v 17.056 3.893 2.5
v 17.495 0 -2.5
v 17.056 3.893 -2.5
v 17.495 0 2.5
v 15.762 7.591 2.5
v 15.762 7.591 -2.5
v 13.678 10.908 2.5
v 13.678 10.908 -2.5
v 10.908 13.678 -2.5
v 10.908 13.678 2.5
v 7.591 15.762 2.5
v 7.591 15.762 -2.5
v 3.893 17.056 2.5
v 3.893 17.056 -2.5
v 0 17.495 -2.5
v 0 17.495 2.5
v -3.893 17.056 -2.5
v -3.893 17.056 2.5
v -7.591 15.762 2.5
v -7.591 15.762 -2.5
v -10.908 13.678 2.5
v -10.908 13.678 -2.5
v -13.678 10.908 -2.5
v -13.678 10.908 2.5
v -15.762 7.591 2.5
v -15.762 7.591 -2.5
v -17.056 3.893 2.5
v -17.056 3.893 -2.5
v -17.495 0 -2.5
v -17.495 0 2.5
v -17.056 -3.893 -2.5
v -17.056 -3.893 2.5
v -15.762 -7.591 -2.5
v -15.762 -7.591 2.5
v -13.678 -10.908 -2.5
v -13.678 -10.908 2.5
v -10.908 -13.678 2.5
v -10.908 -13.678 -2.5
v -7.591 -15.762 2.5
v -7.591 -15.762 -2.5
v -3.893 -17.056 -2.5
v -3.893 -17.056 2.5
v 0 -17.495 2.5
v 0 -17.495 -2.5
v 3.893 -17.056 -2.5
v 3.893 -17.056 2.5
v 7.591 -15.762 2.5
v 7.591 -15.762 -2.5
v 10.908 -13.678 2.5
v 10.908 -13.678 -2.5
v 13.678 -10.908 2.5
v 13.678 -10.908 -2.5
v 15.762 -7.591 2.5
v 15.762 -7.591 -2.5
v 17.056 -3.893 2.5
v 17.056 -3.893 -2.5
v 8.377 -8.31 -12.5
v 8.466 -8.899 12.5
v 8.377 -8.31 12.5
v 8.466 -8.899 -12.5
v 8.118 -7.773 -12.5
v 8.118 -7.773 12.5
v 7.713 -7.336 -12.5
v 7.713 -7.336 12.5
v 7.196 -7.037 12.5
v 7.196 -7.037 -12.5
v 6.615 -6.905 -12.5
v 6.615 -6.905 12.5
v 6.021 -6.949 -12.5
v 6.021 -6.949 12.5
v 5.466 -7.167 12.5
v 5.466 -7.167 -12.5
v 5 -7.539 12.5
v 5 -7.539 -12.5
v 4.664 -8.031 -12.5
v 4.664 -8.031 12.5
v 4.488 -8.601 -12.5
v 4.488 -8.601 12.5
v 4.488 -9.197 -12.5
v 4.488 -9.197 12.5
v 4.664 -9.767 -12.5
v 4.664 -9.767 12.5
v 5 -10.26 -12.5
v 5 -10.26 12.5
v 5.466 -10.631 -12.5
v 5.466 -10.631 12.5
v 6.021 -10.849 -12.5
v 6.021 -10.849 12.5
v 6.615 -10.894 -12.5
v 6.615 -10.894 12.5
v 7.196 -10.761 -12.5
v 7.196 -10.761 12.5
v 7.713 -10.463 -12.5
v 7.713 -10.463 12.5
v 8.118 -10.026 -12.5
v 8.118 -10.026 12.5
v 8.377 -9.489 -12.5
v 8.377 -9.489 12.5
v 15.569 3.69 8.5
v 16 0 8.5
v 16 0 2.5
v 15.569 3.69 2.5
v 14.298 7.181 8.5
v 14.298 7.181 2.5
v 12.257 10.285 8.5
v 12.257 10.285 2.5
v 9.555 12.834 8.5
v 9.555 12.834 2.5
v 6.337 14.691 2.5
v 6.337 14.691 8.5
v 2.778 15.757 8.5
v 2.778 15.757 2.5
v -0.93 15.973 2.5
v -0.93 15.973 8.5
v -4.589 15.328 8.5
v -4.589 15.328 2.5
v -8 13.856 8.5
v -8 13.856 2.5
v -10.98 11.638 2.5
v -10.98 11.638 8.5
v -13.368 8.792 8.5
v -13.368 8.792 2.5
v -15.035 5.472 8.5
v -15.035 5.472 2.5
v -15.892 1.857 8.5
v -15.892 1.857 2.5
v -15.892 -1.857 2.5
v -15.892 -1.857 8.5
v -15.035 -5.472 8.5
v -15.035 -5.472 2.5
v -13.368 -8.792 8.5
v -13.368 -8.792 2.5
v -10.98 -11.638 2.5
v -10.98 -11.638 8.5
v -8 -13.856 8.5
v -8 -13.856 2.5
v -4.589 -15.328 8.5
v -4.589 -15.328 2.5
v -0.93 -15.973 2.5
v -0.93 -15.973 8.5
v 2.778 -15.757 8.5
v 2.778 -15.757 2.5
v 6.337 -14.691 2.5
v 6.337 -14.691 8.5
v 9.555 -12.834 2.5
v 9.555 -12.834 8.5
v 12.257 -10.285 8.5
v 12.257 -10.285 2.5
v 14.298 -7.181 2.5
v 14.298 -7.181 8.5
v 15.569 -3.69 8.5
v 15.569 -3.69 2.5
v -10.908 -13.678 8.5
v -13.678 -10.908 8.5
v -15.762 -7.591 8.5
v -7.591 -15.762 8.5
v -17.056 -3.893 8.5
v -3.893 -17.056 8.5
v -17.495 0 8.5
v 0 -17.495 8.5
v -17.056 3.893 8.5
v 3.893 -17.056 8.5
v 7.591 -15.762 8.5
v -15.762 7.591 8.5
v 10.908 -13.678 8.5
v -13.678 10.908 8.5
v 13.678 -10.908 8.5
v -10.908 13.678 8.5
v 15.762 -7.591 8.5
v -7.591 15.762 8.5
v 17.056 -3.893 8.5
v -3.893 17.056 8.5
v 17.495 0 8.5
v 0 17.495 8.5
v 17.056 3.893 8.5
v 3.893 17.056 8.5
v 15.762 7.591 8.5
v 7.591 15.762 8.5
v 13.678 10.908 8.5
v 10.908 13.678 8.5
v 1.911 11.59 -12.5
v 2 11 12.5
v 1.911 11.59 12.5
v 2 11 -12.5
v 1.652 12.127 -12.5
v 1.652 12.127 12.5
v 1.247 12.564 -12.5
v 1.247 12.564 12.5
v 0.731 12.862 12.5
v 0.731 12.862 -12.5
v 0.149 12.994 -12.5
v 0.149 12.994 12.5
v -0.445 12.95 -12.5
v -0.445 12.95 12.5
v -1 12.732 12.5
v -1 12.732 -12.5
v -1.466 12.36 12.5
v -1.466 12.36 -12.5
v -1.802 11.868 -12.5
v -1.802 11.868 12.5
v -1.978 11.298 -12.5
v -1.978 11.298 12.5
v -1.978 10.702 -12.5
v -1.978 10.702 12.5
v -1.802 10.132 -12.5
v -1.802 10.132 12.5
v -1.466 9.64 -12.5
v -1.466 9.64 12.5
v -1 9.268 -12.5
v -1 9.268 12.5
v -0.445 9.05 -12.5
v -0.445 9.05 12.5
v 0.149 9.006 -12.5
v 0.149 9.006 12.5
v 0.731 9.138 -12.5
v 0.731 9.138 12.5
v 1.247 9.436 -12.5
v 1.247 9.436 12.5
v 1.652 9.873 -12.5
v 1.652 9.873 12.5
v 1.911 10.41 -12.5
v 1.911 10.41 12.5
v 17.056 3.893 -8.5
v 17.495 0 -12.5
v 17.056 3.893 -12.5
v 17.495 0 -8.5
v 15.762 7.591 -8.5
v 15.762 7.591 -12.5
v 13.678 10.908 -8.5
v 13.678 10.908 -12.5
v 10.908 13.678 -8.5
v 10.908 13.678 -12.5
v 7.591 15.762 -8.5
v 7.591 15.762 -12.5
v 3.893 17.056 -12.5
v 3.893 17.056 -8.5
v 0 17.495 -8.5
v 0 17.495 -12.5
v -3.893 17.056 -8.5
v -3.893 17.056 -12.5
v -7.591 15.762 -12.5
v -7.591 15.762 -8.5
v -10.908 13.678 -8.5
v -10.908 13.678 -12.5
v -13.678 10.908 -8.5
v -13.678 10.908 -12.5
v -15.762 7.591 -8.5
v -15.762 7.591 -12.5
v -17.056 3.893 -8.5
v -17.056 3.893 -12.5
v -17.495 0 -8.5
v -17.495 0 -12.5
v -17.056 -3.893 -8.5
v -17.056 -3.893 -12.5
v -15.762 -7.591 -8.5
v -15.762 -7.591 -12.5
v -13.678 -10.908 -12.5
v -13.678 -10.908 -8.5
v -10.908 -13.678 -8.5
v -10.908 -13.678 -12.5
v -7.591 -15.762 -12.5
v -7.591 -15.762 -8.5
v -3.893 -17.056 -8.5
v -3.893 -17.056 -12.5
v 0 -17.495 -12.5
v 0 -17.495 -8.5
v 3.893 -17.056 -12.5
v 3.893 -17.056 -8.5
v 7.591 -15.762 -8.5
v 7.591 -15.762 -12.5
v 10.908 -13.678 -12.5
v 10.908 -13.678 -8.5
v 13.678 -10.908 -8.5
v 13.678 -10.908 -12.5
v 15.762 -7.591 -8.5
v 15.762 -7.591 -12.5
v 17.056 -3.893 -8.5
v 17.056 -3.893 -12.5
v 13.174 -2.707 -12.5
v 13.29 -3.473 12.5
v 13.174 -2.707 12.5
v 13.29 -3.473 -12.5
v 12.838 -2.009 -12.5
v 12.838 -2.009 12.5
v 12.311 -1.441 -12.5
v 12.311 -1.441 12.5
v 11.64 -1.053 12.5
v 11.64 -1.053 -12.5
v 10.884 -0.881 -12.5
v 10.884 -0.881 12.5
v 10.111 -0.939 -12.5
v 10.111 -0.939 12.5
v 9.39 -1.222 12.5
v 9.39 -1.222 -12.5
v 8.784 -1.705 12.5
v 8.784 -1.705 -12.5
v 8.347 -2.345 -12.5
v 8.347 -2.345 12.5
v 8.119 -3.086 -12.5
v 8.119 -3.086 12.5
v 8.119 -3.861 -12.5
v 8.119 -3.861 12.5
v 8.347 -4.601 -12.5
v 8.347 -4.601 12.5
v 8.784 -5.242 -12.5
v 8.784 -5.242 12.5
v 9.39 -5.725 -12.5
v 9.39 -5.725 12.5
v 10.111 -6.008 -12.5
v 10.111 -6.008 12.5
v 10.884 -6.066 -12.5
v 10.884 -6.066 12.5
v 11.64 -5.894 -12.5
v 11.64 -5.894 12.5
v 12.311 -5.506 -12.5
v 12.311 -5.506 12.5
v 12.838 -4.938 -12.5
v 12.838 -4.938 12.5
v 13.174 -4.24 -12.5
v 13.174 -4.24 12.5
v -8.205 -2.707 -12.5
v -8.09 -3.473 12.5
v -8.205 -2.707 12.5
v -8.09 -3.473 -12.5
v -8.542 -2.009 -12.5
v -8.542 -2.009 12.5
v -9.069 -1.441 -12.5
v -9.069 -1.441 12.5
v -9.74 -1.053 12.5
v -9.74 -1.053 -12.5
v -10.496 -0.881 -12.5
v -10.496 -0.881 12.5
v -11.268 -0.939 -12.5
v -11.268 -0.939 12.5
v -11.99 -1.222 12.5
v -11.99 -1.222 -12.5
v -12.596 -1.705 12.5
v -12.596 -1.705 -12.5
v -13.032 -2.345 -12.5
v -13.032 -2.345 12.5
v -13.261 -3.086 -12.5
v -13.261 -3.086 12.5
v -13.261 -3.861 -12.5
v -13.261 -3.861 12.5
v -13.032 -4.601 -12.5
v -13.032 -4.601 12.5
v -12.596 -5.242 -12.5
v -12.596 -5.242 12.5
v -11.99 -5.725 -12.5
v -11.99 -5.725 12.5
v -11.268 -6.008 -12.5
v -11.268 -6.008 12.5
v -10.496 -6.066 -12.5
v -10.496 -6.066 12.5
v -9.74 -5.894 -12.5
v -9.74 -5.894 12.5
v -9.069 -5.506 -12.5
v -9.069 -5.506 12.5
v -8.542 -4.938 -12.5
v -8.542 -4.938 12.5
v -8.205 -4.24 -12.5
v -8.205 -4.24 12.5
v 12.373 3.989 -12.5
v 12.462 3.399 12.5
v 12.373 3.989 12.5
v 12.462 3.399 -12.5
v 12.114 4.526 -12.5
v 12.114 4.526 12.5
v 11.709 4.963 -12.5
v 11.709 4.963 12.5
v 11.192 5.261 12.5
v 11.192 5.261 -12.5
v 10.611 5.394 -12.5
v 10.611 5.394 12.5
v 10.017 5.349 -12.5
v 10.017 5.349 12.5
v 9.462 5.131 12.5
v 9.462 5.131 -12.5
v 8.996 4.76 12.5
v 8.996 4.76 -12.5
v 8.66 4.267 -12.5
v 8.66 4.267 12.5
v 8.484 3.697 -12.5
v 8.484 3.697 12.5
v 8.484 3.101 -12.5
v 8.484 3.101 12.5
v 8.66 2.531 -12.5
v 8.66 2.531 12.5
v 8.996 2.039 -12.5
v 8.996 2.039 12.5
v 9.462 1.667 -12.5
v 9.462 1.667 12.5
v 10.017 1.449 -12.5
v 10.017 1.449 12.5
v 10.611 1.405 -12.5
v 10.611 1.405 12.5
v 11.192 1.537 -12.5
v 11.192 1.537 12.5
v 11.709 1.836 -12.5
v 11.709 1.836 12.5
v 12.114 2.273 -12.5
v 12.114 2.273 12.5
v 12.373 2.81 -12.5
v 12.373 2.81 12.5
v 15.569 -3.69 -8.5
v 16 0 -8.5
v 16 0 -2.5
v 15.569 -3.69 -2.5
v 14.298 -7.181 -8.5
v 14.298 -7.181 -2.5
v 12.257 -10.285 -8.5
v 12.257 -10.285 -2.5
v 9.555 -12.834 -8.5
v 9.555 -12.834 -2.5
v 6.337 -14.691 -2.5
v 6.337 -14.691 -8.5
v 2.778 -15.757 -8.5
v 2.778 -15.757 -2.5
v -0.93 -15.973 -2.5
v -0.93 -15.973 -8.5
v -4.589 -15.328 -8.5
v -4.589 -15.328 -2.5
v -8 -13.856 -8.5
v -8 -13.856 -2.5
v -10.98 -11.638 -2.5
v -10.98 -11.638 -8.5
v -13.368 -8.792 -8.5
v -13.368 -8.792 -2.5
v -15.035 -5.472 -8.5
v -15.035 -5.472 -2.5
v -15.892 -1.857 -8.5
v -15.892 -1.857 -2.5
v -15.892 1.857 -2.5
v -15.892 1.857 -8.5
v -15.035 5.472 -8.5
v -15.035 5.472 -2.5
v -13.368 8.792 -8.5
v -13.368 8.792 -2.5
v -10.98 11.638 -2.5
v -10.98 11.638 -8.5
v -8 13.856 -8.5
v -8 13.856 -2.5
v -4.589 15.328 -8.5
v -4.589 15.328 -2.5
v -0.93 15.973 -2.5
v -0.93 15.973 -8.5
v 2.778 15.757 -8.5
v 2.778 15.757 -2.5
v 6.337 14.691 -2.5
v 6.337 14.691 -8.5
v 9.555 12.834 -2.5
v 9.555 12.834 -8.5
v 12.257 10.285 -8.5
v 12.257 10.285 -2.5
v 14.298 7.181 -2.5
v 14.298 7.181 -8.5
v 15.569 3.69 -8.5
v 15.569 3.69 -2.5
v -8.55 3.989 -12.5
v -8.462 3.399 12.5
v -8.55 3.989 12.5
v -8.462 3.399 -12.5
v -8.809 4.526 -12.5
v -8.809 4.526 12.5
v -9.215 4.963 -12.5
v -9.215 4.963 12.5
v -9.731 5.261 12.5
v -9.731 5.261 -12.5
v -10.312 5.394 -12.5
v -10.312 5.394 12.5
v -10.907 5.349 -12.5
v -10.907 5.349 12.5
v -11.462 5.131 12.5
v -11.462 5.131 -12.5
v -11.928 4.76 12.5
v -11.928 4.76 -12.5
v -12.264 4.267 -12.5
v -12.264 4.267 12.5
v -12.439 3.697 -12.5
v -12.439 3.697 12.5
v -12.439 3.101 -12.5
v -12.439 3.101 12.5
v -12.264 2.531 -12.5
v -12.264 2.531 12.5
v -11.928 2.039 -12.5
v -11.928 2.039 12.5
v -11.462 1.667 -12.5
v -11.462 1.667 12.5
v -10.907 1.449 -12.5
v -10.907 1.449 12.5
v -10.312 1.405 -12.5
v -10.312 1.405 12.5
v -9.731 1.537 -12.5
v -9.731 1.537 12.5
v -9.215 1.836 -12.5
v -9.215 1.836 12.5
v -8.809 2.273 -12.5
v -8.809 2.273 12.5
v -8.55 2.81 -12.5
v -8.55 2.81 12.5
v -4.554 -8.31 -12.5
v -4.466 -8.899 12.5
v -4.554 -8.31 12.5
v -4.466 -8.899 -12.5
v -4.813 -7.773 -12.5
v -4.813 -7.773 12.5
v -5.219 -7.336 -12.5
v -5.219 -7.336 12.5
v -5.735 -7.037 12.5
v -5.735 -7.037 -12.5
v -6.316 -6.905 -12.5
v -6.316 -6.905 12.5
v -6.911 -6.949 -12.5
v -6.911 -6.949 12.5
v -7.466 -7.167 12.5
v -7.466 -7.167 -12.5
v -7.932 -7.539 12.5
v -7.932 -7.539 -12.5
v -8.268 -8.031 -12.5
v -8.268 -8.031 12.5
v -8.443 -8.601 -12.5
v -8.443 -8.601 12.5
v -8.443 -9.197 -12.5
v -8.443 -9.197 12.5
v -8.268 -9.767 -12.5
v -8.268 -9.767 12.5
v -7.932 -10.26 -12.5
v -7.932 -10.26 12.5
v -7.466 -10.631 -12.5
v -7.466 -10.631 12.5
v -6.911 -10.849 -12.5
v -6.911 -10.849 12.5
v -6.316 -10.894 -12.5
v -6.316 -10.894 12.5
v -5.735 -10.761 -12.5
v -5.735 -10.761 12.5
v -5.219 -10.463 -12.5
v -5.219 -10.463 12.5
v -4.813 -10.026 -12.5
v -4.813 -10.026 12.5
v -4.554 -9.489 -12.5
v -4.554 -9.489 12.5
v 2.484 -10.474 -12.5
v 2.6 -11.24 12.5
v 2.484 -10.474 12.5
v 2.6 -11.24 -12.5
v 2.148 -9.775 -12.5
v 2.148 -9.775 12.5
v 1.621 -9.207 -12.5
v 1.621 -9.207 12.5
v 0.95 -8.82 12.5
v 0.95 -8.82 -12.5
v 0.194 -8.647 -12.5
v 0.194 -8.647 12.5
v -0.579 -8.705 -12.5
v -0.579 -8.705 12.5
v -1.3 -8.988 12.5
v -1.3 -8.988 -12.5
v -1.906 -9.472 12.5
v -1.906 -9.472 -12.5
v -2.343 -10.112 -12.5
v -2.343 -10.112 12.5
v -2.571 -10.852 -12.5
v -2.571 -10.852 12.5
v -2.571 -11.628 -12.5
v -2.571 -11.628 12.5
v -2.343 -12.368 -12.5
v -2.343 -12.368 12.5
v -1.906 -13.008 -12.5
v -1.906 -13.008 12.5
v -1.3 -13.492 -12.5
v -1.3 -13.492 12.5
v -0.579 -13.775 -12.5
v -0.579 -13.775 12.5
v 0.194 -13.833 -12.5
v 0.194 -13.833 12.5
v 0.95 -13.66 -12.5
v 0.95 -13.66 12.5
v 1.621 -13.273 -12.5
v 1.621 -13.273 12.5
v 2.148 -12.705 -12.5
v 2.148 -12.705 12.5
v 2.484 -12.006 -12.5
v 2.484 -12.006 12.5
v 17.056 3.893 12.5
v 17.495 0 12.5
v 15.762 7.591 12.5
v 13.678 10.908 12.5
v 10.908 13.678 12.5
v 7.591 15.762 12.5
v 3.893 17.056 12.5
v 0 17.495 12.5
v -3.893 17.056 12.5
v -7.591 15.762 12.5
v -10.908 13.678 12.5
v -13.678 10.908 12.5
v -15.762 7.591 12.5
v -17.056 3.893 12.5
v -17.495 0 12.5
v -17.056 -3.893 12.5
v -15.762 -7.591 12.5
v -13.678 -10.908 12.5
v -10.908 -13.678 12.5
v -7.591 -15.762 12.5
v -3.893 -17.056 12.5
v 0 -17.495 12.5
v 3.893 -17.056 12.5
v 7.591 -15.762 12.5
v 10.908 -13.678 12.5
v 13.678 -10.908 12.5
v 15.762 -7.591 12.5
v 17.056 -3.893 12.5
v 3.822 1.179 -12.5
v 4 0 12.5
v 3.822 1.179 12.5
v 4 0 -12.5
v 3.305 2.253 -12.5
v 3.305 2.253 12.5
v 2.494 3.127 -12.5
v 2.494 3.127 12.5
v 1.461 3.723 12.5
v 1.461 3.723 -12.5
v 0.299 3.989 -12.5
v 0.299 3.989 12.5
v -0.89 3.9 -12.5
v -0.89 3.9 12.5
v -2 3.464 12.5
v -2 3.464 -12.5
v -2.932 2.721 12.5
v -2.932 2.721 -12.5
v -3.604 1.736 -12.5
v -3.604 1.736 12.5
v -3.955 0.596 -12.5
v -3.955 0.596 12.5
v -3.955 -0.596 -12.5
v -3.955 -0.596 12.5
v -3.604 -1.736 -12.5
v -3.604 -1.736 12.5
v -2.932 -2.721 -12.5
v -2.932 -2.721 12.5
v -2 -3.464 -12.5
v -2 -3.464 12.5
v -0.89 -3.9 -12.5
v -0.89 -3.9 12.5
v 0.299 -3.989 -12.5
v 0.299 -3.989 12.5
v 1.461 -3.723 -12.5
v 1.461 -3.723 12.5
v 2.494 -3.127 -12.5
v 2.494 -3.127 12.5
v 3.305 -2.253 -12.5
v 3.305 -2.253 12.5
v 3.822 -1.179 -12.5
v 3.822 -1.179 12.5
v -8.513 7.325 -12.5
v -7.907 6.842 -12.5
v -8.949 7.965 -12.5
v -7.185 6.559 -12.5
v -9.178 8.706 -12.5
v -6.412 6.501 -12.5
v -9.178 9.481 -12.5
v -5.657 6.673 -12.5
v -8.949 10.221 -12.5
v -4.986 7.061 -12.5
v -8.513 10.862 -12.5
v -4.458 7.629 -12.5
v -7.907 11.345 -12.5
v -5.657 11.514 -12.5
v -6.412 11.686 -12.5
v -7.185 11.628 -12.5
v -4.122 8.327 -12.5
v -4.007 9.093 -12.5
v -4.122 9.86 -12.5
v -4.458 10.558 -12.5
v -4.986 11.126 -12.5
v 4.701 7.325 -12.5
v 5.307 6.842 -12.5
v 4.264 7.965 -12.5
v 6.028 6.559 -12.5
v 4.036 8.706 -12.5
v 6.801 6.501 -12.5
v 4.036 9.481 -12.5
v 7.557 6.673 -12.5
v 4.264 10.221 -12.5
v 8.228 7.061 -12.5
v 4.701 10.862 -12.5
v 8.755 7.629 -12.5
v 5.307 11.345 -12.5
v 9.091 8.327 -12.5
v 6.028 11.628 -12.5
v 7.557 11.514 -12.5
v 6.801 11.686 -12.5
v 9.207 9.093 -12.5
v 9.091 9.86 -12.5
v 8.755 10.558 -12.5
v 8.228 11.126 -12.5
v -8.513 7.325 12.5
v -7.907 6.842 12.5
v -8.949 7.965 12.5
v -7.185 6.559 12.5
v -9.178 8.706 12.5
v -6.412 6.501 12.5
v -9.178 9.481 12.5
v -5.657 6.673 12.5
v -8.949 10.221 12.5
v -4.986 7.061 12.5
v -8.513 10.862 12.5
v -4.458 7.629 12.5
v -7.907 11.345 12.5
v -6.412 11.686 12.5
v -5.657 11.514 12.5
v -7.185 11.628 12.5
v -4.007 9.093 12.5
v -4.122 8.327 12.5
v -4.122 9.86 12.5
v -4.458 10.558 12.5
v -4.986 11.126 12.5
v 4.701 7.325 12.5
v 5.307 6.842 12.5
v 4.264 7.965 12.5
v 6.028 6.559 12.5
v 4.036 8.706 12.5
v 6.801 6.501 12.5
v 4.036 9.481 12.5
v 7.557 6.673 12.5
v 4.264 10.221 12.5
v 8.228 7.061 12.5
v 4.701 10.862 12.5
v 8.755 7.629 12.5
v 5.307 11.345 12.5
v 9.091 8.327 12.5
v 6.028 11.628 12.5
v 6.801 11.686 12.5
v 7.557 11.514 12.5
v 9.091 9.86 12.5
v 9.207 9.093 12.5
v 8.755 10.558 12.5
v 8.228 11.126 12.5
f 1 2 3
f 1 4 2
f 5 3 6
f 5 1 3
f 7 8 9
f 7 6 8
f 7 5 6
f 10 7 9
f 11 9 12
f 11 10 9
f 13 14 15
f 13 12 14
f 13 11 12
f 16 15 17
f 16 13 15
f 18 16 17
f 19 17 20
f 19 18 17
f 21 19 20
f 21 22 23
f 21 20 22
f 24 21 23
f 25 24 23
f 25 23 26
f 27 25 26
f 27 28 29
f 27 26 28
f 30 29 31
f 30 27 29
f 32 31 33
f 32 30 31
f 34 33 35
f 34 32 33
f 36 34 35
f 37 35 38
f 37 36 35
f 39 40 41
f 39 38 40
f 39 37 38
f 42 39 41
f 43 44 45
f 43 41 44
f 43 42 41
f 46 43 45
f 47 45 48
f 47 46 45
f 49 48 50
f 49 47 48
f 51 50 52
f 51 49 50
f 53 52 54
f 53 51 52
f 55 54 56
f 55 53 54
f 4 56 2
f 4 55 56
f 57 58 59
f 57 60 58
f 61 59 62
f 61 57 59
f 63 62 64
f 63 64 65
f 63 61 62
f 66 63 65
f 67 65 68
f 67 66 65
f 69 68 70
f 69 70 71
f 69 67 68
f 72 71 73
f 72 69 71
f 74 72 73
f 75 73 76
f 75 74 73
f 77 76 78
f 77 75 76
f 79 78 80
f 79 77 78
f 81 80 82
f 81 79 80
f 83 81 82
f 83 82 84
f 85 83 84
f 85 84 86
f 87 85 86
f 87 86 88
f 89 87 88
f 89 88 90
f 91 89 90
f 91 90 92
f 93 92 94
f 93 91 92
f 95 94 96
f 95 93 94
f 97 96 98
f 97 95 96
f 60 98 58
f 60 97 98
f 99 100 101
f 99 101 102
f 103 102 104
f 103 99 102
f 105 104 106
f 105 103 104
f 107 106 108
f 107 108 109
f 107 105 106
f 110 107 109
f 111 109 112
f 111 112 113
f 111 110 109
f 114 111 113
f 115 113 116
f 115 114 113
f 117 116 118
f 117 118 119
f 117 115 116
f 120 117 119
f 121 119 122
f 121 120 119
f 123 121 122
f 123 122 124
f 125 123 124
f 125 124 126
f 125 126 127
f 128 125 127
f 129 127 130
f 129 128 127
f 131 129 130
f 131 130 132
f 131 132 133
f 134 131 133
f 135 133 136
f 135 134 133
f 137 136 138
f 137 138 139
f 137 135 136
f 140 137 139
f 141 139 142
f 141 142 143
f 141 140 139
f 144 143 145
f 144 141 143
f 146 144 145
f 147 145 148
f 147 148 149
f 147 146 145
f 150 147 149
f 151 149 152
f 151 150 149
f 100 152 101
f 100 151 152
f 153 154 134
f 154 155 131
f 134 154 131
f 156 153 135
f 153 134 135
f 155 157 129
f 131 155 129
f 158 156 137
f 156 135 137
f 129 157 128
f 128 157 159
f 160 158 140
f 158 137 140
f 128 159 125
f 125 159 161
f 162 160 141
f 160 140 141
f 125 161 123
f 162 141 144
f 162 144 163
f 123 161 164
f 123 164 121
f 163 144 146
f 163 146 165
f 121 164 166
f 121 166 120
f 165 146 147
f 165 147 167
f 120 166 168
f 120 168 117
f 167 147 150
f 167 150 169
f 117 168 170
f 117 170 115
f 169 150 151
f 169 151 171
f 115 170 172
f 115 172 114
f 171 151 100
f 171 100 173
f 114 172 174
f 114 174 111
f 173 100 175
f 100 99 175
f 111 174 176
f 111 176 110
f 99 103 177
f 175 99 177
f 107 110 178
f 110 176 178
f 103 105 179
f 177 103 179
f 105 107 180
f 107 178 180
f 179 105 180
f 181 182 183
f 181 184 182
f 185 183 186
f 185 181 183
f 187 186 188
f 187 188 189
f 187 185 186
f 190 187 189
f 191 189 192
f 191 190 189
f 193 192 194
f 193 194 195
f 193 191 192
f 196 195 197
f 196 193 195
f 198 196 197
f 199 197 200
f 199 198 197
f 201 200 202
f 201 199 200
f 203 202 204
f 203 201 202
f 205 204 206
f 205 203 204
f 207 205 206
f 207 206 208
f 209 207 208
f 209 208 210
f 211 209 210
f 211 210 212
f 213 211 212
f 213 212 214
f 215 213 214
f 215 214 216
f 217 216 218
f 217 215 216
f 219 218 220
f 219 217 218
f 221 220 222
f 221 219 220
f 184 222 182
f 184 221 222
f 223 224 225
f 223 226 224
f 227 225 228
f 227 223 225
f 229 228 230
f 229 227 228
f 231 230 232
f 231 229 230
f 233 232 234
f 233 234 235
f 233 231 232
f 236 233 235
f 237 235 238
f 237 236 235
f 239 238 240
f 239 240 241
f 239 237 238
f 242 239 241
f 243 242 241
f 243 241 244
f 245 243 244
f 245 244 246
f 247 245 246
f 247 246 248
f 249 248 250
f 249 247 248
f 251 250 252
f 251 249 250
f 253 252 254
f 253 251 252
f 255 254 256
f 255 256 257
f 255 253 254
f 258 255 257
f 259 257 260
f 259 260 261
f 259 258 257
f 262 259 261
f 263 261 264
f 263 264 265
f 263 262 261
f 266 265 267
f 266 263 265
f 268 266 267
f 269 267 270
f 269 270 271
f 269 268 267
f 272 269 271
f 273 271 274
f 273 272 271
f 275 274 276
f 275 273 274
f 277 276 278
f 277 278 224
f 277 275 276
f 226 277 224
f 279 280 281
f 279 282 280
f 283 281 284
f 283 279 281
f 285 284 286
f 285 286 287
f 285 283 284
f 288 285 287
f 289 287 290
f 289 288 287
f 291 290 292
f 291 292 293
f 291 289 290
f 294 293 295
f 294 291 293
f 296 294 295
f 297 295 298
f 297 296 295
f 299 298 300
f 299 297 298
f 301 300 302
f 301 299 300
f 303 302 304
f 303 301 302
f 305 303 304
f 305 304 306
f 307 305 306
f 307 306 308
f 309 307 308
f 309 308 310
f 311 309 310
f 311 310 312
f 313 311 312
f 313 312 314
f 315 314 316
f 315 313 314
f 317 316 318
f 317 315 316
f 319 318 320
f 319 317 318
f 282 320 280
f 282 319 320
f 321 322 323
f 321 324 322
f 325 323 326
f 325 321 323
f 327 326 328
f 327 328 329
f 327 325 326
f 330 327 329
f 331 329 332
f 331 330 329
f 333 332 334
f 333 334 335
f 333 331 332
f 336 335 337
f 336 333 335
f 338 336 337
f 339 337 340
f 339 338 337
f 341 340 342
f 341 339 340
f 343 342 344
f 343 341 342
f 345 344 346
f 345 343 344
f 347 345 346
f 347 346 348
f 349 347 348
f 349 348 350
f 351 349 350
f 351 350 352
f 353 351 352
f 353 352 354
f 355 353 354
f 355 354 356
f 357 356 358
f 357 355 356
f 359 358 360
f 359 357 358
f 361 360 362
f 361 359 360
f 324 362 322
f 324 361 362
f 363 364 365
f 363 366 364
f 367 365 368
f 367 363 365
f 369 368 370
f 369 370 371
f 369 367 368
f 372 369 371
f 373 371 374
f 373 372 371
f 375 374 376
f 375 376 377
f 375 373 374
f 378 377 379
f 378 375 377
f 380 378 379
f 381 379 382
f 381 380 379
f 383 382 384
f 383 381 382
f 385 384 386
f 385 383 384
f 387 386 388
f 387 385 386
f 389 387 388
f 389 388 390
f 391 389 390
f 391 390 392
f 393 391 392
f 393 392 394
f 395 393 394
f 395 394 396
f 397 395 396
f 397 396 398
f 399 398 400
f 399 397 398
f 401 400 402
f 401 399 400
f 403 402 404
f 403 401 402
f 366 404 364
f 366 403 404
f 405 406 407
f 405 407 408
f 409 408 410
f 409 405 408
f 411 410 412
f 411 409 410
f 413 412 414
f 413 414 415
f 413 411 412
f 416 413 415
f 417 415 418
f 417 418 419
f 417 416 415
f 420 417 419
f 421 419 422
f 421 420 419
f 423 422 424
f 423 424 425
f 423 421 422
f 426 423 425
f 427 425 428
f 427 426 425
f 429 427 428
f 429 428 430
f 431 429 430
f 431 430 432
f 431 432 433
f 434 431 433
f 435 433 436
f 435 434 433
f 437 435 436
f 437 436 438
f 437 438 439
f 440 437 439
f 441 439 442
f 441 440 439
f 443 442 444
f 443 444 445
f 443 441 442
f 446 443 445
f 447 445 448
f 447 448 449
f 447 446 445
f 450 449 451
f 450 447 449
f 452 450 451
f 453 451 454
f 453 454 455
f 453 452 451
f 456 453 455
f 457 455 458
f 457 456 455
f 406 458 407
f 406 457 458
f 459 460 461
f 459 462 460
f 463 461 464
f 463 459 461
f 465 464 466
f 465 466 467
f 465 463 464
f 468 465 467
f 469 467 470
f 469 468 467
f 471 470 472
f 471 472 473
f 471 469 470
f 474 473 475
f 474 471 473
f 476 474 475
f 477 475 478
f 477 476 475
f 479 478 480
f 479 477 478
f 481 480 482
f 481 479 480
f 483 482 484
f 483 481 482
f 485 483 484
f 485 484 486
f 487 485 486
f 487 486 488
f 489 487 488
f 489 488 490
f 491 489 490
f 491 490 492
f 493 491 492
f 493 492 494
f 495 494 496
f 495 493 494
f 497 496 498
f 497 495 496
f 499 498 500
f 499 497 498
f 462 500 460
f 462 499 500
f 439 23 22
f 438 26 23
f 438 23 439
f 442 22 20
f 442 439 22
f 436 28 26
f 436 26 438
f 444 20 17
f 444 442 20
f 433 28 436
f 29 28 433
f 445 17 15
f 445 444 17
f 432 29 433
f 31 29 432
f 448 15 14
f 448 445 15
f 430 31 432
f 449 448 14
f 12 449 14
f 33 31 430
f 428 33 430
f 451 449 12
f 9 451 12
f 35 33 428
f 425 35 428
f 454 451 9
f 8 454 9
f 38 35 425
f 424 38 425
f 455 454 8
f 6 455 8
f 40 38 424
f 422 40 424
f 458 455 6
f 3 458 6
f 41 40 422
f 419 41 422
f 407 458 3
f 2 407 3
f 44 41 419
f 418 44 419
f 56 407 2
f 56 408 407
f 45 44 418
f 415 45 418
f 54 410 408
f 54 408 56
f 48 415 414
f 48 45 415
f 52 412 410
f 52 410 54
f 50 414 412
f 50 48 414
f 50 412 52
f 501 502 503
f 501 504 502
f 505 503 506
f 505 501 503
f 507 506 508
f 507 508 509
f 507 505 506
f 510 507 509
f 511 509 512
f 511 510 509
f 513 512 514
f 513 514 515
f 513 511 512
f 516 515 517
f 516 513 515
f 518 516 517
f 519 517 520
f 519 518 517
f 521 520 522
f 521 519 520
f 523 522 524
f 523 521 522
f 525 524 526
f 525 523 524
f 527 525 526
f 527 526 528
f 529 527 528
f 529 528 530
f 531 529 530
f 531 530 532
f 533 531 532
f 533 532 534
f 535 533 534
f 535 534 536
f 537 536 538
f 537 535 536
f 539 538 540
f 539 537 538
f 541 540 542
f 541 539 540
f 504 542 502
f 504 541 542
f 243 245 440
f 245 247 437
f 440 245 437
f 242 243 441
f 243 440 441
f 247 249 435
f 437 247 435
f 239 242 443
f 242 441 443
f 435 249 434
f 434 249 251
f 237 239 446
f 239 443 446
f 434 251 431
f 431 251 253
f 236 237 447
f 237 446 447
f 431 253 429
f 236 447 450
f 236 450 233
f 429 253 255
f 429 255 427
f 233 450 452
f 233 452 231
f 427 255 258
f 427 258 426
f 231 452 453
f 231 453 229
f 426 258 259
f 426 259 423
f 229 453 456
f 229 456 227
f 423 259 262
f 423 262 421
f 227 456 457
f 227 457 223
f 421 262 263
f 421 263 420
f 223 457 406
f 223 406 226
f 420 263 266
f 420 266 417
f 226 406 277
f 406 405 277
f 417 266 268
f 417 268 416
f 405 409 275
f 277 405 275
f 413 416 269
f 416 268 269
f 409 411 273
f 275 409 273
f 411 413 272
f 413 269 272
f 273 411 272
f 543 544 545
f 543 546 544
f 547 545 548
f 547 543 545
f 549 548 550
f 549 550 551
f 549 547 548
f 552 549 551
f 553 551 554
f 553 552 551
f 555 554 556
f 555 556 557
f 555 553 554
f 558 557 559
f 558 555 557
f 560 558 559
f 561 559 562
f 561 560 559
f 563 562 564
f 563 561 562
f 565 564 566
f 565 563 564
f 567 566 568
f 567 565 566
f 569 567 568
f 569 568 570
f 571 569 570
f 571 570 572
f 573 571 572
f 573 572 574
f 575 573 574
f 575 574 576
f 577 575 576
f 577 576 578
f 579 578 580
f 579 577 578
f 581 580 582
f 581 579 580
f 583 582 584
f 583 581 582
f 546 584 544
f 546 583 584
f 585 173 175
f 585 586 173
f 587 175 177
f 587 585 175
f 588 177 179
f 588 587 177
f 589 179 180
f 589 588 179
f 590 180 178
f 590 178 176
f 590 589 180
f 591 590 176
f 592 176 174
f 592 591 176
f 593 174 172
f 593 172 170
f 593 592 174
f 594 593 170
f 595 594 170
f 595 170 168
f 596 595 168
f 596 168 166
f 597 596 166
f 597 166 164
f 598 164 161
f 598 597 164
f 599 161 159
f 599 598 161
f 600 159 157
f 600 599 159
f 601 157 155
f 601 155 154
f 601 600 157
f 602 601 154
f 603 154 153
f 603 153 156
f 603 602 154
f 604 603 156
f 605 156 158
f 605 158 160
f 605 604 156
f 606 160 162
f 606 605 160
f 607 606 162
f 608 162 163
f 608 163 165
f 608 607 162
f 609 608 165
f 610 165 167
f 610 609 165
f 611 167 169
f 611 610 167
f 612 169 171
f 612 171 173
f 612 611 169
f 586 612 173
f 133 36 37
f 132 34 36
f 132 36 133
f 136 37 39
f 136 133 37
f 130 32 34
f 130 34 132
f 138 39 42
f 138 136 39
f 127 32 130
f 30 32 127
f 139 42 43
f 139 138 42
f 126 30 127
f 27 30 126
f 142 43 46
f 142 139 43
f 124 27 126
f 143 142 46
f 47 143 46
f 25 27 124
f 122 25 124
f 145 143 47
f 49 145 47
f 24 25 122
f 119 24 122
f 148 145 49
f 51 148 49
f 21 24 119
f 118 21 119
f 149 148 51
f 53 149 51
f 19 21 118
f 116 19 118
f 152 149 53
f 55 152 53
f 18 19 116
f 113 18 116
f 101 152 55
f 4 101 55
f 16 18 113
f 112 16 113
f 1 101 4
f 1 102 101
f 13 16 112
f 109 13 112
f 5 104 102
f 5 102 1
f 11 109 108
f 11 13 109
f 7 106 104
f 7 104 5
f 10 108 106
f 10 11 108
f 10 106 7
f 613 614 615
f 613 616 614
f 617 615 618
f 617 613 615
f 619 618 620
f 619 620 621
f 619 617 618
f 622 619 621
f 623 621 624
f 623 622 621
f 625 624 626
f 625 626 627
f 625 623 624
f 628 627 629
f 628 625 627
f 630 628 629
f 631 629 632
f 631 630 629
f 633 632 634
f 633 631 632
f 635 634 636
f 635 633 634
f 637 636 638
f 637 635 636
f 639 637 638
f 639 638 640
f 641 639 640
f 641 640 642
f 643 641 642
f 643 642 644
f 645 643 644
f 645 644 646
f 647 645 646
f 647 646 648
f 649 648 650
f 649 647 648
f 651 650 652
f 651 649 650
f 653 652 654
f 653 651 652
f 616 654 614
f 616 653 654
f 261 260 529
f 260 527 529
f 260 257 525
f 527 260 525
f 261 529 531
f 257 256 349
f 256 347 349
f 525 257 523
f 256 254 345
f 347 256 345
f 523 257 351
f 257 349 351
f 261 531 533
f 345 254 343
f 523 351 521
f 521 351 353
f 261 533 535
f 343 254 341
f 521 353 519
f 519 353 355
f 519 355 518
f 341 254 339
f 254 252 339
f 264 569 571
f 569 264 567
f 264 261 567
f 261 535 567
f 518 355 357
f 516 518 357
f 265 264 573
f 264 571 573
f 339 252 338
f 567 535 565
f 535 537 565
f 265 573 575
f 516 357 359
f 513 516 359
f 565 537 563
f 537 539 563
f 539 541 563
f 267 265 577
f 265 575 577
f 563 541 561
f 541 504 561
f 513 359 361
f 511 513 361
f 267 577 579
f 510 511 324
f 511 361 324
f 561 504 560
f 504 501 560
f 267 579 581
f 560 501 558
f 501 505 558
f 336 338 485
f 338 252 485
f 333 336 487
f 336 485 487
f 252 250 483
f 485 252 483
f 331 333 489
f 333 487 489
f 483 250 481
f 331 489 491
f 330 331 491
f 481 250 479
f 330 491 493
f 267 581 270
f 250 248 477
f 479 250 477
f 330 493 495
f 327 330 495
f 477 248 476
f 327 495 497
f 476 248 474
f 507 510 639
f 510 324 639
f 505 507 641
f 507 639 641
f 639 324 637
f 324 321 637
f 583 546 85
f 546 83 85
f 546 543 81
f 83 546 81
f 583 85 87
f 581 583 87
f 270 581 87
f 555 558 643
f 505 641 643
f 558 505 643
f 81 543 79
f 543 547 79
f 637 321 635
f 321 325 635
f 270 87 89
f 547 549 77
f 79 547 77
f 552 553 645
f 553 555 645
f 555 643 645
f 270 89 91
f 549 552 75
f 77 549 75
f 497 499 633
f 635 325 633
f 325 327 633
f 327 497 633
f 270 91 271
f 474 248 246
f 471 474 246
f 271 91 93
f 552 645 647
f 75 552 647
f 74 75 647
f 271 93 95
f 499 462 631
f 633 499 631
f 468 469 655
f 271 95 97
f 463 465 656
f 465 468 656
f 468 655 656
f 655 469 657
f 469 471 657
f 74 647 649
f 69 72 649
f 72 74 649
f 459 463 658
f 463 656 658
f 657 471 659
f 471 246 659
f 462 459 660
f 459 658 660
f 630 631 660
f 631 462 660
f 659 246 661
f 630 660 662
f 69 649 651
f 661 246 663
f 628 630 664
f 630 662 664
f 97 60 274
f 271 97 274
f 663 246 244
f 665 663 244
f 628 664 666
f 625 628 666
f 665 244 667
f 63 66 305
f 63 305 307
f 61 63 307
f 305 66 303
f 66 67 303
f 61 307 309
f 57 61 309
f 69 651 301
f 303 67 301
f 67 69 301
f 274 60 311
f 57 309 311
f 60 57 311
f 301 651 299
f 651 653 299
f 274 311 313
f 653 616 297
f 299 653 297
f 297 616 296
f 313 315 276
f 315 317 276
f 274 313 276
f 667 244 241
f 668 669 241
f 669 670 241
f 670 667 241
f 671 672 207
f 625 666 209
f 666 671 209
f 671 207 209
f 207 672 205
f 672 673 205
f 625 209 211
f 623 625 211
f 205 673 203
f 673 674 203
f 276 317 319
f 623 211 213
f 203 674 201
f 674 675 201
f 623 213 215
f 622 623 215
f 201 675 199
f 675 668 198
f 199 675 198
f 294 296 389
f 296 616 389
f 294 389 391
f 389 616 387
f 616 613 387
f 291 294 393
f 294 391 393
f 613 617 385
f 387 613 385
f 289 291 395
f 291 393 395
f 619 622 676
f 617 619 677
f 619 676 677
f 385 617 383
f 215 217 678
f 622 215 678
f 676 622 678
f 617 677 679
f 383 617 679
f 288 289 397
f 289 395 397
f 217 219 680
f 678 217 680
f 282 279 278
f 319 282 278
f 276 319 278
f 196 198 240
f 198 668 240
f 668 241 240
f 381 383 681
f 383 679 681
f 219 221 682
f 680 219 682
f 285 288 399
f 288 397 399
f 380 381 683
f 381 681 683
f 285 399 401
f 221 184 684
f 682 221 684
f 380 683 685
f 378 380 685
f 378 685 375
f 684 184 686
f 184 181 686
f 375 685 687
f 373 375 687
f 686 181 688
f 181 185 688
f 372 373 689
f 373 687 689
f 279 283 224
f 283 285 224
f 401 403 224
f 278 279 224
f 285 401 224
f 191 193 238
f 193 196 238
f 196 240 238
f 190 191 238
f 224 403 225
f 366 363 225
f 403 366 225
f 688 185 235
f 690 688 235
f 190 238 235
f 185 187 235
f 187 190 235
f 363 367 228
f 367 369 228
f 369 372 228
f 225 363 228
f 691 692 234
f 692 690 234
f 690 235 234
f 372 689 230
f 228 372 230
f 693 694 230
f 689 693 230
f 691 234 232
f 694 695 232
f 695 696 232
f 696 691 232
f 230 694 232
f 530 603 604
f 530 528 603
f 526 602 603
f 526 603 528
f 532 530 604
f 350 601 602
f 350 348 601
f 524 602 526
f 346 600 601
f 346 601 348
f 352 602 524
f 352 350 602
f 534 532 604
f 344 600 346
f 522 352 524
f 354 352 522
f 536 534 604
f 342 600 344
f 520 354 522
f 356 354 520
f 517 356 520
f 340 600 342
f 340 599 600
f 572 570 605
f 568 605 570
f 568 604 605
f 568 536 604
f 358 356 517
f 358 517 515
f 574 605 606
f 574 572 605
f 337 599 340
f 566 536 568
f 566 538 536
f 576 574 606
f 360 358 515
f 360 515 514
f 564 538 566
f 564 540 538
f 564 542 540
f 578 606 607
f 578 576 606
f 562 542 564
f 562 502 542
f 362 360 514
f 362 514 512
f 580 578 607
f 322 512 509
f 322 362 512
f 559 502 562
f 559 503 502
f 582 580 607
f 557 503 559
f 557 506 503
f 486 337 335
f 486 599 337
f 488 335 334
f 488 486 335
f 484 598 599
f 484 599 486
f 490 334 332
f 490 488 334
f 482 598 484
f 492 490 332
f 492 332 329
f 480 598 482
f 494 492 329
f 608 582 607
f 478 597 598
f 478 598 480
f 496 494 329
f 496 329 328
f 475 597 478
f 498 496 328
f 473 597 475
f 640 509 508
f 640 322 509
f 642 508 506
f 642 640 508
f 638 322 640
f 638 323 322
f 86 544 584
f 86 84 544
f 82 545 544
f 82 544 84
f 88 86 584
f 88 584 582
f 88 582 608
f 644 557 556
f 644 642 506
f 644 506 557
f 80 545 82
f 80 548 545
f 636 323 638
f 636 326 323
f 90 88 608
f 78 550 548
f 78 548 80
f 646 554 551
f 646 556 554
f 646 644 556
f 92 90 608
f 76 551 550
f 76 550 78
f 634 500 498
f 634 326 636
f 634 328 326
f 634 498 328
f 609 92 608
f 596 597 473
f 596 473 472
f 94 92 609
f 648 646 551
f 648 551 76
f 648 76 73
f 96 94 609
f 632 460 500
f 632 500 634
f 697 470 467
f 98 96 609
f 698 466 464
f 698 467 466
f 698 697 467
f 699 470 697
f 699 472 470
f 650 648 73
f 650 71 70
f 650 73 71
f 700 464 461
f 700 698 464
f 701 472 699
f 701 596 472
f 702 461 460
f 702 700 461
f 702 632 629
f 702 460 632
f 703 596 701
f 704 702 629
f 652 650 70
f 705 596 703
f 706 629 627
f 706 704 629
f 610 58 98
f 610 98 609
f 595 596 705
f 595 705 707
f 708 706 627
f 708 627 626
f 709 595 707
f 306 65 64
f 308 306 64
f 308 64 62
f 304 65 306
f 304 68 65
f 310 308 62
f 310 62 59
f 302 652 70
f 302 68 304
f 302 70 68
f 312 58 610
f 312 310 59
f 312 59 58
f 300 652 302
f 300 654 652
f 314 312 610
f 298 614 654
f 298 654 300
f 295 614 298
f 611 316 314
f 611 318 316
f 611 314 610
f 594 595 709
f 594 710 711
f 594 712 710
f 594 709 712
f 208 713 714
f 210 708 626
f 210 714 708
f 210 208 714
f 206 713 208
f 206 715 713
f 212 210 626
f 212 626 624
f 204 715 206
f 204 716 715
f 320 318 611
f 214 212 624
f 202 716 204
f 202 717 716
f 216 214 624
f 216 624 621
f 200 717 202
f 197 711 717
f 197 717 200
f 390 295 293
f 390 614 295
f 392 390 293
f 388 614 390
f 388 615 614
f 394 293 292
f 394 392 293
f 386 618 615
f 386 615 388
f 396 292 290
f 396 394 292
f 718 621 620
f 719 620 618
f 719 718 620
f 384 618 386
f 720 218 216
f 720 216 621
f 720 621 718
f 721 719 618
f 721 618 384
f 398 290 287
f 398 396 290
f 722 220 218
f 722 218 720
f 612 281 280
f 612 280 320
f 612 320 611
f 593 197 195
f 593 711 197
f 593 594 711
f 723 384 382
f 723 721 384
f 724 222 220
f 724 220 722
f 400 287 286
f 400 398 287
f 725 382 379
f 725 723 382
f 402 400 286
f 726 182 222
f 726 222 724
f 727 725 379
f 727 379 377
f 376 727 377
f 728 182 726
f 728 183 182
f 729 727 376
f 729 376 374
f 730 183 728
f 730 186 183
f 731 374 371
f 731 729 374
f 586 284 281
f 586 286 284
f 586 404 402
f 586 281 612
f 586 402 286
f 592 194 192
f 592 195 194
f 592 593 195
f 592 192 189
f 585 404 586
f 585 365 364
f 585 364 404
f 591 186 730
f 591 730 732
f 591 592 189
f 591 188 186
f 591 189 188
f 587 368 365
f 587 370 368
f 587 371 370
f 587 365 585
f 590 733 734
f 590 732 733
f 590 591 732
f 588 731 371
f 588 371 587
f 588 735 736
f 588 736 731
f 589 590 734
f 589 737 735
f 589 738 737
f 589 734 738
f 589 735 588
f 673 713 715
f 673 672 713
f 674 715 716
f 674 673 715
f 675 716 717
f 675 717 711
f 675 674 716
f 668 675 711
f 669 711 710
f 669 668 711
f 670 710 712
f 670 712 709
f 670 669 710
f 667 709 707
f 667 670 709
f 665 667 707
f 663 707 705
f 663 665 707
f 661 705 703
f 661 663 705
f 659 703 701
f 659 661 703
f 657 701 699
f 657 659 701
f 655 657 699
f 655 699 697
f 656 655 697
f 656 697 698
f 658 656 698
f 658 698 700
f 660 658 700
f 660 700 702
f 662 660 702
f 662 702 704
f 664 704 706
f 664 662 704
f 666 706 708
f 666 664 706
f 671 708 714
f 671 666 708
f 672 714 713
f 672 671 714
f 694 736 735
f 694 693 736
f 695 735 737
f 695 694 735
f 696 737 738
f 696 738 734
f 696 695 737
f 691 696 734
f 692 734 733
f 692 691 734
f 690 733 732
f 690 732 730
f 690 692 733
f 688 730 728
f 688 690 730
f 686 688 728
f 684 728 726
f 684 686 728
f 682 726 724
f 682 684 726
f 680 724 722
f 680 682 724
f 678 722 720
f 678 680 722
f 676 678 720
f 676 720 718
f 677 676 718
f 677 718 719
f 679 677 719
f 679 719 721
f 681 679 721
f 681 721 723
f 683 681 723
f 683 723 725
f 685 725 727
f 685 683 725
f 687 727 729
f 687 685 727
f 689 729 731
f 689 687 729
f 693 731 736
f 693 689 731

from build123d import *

# Parameters (mm, degrees)
F0_R     = 17.495
F0_R_2   = 15.95
F0_R_3   = 2
F0_R_4   = 2.6
F0_R_5   = 4
F1_DEPTH = 12.5
F3_START = -4
F2_R     = 17.495
F2_R_2   = 16
F3_DEPTH = 6
F5_START = -4
F4_R     = 17.495
F4_R_2   = 16
F5_DEPTH = 6


with BuildPart() as f1:
    # F0 (on Top) → F1 (new body, symmetric)
    with BuildSketch(Plane.XY):
        Circle(F0_R)
        Circle(F0_R_2, mode=Mode.SUBTRACT)
        Circle(F0_R_2)
        with Locations((-6.4656377752, -8.8991869381)):
            Circle(F0_R_3, mode=Mode.SUBTRACT)
        with Locations((-10.6898752432, -3.4733510168)):
            Circle(F0_R_4, mode=Mode.SUBTRACT)
        with Locations((0, -11.24)):
            Circle(F0_R_4, mode=Mode.SUBTRACT)
        with Locations((6.4656377752, -8.8991869381)):
            Circle(F0_R_3, mode=Mode.SUBTRACT)
        with Locations((10.6898752432, -3.4733510168)):
            Circle(F0_R_4, mode=Mode.SUBTRACT)
        with Locations((-10.4616216792, 3.3991869381)):
            Circle(F0_R_3, mode=Mode.SUBTRACT)
        with Locations((-6.6067062358, 9.0933510168)):
            Circle(F0_R_4, mode=Mode.SUBTRACT)
        Circle(F0_R_5, mode=Mode.SUBTRACT)
        with Locations((10.4616216792, 3.3991869381)):
            Circle(F0_R_3, mode=Mode.SUBTRACT)
        with Locations((0, 11)):
            Circle(F0_R_3, mode=Mode.SUBTRACT)
        with Locations((6.6067062358, 9.0933510168)):
            Circle(F0_R_4, mode=Mode.SUBTRACT)
    extrude(amount=F1_DEPTH, both=True)

    # F2 (on face) → F3 (cut)
    with BuildSketch(Plane.XY.offset(12.5).offset(F3_START)):
        Circle(F2_R)
        Circle(F2_R_2, mode=Mode.SUBTRACT)
    extrude(amount=-F3_DEPTH, mode=Mode.SUBTRACT)

    # F4 (on face) → F5 (cut)
    with BuildSketch(Plane(origin=(0, 0, -12.5), x_dir=(1, 0, 0), z_dir=(0, 0, -1)).offset(F5_START)):
        Circle(F4_R)
        Circle(F4_R_2, mode=Mode.SUBTRACT)
    extrude(amount=-F5_DEPTH, mode=Mode.SUBTRACT)


solid = f1.part
